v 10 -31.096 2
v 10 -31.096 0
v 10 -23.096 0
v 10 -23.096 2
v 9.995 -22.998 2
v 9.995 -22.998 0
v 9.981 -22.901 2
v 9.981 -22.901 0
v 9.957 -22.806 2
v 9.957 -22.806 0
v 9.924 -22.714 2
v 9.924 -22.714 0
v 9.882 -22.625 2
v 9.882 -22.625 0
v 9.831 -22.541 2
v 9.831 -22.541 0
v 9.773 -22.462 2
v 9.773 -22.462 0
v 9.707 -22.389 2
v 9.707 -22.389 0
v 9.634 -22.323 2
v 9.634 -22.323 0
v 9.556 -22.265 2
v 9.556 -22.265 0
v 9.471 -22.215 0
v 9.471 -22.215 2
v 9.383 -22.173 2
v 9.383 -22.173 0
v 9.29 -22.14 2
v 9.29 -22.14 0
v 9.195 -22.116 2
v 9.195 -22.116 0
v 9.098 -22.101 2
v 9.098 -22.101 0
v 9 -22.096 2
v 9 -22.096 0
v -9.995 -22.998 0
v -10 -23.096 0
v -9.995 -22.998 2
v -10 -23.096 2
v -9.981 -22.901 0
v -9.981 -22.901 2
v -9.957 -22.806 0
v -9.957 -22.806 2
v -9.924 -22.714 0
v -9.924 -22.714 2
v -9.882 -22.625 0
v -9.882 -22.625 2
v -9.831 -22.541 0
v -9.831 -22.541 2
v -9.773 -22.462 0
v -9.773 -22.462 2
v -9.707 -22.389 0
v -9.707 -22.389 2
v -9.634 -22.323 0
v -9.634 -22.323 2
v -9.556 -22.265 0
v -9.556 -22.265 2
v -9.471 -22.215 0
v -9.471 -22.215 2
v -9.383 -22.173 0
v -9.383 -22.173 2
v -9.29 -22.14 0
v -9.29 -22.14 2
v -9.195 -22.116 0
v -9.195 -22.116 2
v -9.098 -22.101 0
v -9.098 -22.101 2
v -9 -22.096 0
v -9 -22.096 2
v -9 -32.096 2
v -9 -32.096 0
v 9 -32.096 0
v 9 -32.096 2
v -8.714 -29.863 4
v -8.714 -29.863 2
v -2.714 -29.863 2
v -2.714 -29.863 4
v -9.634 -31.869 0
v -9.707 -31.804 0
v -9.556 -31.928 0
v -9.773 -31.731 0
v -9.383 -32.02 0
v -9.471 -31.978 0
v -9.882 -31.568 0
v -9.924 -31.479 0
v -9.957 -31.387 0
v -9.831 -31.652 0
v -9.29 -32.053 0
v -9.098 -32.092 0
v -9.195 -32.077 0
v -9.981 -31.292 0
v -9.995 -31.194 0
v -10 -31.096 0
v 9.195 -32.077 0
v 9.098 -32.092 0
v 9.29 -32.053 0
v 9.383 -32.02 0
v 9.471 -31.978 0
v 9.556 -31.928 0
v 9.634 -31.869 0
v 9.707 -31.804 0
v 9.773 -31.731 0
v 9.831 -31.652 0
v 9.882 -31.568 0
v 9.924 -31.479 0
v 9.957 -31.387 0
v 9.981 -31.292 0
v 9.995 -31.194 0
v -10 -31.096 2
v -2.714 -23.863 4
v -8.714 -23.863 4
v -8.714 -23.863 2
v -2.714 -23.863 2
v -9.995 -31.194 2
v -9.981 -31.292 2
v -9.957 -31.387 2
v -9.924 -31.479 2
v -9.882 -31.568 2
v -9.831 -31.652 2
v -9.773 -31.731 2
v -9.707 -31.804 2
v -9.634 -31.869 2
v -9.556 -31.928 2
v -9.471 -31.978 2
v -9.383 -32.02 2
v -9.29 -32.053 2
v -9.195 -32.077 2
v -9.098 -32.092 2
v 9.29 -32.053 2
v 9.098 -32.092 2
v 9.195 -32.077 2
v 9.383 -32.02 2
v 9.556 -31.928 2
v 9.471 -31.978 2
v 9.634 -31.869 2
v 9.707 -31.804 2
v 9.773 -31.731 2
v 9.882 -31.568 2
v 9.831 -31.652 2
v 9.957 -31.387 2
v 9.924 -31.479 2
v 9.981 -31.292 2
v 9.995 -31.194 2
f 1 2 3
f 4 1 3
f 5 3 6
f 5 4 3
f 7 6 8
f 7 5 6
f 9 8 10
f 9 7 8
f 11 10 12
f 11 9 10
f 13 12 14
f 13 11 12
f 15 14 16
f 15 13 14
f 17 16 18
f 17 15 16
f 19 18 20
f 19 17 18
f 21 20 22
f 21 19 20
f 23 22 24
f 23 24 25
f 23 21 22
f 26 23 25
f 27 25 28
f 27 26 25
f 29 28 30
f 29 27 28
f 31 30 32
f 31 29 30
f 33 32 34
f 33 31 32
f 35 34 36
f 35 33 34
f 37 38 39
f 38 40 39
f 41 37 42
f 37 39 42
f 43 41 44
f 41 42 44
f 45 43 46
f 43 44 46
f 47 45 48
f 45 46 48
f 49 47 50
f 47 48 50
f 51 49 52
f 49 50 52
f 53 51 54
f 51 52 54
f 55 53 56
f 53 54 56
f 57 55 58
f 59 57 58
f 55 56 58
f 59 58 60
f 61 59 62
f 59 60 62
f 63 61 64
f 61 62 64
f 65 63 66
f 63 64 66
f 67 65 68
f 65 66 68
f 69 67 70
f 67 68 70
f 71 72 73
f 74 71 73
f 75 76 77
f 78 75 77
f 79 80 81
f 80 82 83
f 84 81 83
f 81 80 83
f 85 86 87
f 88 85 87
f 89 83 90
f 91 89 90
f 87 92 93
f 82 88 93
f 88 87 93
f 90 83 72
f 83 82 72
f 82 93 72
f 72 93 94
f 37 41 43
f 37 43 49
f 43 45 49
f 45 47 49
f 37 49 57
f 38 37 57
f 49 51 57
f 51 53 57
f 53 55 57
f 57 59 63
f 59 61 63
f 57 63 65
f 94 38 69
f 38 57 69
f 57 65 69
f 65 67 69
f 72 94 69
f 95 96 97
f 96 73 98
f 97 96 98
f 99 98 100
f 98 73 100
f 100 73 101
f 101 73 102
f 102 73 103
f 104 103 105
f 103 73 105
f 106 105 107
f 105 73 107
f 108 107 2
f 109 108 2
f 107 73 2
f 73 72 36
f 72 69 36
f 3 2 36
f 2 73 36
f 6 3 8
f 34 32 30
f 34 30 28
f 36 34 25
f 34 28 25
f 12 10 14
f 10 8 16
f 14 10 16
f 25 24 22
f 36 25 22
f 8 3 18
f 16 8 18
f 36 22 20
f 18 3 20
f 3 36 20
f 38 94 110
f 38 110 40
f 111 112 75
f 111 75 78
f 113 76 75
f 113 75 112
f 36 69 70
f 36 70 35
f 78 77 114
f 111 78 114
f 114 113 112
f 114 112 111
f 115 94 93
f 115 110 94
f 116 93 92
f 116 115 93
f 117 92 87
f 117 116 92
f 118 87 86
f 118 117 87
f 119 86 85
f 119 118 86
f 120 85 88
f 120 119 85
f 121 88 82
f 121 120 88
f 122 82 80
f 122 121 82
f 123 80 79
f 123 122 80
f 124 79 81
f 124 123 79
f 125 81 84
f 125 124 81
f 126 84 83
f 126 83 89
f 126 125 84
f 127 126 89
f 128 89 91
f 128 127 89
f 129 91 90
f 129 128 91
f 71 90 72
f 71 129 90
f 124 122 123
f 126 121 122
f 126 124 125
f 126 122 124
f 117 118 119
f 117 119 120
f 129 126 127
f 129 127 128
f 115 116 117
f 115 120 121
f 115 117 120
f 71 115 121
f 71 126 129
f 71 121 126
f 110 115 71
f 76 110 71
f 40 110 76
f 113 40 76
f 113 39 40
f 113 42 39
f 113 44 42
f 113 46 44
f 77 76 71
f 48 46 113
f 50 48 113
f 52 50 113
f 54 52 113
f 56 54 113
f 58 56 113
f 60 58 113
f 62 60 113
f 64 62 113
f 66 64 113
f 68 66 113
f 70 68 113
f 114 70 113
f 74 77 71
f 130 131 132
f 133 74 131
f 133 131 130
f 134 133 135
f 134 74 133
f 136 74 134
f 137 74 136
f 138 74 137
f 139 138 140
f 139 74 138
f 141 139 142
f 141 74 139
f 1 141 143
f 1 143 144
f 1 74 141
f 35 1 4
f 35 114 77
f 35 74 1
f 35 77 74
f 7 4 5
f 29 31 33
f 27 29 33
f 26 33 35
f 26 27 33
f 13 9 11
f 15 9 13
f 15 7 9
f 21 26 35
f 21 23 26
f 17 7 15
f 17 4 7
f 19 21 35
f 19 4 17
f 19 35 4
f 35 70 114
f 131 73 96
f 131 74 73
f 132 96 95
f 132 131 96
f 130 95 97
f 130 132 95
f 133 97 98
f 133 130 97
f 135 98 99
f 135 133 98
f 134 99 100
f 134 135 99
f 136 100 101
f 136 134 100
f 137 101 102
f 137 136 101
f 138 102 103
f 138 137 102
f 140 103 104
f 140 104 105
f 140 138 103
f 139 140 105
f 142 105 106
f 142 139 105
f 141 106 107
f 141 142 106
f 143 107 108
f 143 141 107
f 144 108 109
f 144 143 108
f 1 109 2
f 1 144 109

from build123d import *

# Parameters (mm, degrees)
SKETCH1_W           = 20
SKETCH1_H           = 10
BOSS_EXTRUDE1_DEPTH = 2
FILLET1_R           = 1
SKETCH2_W           = 6
SKETCH2_H           = 6
BOSS_EXTRUDE2_DEPTH = 2


with BuildPart() as part:
    # Sketch1 → Boss-Extrude1 (new body)
    with BuildSketch(Plane.XY):
        with Locations((0, -27.096458497)):
            Rectangle(SKETCH1_W, SKETCH1_H)
    extrude(amount=BOSS_EXTRUDE1_DEPTH)

    # Fillet1
    fillet1_edges = [part.edges().sort_by_distance(p)[0] for p in [
        (-10, -22.096458497, 1),
        (10, -22.096458497, 1),
        (10, -32.096458497, 1),
        (-10, -32.096458497, 1),
    ]]
    fillet(fillet1_edges, radius=FILLET1_R)

    # Sketch2 → Boss-Extrude2 (add)
    with BuildSketch(Plane.XY.offset(2)):
        with Locations((-5.714480975, -26.862957006)):
            Rectangle(SKETCH2_W, SKETCH2_H)
    extrude(amount=BOSS_EXTRUDE2_DEPTH)


solid = part.part
